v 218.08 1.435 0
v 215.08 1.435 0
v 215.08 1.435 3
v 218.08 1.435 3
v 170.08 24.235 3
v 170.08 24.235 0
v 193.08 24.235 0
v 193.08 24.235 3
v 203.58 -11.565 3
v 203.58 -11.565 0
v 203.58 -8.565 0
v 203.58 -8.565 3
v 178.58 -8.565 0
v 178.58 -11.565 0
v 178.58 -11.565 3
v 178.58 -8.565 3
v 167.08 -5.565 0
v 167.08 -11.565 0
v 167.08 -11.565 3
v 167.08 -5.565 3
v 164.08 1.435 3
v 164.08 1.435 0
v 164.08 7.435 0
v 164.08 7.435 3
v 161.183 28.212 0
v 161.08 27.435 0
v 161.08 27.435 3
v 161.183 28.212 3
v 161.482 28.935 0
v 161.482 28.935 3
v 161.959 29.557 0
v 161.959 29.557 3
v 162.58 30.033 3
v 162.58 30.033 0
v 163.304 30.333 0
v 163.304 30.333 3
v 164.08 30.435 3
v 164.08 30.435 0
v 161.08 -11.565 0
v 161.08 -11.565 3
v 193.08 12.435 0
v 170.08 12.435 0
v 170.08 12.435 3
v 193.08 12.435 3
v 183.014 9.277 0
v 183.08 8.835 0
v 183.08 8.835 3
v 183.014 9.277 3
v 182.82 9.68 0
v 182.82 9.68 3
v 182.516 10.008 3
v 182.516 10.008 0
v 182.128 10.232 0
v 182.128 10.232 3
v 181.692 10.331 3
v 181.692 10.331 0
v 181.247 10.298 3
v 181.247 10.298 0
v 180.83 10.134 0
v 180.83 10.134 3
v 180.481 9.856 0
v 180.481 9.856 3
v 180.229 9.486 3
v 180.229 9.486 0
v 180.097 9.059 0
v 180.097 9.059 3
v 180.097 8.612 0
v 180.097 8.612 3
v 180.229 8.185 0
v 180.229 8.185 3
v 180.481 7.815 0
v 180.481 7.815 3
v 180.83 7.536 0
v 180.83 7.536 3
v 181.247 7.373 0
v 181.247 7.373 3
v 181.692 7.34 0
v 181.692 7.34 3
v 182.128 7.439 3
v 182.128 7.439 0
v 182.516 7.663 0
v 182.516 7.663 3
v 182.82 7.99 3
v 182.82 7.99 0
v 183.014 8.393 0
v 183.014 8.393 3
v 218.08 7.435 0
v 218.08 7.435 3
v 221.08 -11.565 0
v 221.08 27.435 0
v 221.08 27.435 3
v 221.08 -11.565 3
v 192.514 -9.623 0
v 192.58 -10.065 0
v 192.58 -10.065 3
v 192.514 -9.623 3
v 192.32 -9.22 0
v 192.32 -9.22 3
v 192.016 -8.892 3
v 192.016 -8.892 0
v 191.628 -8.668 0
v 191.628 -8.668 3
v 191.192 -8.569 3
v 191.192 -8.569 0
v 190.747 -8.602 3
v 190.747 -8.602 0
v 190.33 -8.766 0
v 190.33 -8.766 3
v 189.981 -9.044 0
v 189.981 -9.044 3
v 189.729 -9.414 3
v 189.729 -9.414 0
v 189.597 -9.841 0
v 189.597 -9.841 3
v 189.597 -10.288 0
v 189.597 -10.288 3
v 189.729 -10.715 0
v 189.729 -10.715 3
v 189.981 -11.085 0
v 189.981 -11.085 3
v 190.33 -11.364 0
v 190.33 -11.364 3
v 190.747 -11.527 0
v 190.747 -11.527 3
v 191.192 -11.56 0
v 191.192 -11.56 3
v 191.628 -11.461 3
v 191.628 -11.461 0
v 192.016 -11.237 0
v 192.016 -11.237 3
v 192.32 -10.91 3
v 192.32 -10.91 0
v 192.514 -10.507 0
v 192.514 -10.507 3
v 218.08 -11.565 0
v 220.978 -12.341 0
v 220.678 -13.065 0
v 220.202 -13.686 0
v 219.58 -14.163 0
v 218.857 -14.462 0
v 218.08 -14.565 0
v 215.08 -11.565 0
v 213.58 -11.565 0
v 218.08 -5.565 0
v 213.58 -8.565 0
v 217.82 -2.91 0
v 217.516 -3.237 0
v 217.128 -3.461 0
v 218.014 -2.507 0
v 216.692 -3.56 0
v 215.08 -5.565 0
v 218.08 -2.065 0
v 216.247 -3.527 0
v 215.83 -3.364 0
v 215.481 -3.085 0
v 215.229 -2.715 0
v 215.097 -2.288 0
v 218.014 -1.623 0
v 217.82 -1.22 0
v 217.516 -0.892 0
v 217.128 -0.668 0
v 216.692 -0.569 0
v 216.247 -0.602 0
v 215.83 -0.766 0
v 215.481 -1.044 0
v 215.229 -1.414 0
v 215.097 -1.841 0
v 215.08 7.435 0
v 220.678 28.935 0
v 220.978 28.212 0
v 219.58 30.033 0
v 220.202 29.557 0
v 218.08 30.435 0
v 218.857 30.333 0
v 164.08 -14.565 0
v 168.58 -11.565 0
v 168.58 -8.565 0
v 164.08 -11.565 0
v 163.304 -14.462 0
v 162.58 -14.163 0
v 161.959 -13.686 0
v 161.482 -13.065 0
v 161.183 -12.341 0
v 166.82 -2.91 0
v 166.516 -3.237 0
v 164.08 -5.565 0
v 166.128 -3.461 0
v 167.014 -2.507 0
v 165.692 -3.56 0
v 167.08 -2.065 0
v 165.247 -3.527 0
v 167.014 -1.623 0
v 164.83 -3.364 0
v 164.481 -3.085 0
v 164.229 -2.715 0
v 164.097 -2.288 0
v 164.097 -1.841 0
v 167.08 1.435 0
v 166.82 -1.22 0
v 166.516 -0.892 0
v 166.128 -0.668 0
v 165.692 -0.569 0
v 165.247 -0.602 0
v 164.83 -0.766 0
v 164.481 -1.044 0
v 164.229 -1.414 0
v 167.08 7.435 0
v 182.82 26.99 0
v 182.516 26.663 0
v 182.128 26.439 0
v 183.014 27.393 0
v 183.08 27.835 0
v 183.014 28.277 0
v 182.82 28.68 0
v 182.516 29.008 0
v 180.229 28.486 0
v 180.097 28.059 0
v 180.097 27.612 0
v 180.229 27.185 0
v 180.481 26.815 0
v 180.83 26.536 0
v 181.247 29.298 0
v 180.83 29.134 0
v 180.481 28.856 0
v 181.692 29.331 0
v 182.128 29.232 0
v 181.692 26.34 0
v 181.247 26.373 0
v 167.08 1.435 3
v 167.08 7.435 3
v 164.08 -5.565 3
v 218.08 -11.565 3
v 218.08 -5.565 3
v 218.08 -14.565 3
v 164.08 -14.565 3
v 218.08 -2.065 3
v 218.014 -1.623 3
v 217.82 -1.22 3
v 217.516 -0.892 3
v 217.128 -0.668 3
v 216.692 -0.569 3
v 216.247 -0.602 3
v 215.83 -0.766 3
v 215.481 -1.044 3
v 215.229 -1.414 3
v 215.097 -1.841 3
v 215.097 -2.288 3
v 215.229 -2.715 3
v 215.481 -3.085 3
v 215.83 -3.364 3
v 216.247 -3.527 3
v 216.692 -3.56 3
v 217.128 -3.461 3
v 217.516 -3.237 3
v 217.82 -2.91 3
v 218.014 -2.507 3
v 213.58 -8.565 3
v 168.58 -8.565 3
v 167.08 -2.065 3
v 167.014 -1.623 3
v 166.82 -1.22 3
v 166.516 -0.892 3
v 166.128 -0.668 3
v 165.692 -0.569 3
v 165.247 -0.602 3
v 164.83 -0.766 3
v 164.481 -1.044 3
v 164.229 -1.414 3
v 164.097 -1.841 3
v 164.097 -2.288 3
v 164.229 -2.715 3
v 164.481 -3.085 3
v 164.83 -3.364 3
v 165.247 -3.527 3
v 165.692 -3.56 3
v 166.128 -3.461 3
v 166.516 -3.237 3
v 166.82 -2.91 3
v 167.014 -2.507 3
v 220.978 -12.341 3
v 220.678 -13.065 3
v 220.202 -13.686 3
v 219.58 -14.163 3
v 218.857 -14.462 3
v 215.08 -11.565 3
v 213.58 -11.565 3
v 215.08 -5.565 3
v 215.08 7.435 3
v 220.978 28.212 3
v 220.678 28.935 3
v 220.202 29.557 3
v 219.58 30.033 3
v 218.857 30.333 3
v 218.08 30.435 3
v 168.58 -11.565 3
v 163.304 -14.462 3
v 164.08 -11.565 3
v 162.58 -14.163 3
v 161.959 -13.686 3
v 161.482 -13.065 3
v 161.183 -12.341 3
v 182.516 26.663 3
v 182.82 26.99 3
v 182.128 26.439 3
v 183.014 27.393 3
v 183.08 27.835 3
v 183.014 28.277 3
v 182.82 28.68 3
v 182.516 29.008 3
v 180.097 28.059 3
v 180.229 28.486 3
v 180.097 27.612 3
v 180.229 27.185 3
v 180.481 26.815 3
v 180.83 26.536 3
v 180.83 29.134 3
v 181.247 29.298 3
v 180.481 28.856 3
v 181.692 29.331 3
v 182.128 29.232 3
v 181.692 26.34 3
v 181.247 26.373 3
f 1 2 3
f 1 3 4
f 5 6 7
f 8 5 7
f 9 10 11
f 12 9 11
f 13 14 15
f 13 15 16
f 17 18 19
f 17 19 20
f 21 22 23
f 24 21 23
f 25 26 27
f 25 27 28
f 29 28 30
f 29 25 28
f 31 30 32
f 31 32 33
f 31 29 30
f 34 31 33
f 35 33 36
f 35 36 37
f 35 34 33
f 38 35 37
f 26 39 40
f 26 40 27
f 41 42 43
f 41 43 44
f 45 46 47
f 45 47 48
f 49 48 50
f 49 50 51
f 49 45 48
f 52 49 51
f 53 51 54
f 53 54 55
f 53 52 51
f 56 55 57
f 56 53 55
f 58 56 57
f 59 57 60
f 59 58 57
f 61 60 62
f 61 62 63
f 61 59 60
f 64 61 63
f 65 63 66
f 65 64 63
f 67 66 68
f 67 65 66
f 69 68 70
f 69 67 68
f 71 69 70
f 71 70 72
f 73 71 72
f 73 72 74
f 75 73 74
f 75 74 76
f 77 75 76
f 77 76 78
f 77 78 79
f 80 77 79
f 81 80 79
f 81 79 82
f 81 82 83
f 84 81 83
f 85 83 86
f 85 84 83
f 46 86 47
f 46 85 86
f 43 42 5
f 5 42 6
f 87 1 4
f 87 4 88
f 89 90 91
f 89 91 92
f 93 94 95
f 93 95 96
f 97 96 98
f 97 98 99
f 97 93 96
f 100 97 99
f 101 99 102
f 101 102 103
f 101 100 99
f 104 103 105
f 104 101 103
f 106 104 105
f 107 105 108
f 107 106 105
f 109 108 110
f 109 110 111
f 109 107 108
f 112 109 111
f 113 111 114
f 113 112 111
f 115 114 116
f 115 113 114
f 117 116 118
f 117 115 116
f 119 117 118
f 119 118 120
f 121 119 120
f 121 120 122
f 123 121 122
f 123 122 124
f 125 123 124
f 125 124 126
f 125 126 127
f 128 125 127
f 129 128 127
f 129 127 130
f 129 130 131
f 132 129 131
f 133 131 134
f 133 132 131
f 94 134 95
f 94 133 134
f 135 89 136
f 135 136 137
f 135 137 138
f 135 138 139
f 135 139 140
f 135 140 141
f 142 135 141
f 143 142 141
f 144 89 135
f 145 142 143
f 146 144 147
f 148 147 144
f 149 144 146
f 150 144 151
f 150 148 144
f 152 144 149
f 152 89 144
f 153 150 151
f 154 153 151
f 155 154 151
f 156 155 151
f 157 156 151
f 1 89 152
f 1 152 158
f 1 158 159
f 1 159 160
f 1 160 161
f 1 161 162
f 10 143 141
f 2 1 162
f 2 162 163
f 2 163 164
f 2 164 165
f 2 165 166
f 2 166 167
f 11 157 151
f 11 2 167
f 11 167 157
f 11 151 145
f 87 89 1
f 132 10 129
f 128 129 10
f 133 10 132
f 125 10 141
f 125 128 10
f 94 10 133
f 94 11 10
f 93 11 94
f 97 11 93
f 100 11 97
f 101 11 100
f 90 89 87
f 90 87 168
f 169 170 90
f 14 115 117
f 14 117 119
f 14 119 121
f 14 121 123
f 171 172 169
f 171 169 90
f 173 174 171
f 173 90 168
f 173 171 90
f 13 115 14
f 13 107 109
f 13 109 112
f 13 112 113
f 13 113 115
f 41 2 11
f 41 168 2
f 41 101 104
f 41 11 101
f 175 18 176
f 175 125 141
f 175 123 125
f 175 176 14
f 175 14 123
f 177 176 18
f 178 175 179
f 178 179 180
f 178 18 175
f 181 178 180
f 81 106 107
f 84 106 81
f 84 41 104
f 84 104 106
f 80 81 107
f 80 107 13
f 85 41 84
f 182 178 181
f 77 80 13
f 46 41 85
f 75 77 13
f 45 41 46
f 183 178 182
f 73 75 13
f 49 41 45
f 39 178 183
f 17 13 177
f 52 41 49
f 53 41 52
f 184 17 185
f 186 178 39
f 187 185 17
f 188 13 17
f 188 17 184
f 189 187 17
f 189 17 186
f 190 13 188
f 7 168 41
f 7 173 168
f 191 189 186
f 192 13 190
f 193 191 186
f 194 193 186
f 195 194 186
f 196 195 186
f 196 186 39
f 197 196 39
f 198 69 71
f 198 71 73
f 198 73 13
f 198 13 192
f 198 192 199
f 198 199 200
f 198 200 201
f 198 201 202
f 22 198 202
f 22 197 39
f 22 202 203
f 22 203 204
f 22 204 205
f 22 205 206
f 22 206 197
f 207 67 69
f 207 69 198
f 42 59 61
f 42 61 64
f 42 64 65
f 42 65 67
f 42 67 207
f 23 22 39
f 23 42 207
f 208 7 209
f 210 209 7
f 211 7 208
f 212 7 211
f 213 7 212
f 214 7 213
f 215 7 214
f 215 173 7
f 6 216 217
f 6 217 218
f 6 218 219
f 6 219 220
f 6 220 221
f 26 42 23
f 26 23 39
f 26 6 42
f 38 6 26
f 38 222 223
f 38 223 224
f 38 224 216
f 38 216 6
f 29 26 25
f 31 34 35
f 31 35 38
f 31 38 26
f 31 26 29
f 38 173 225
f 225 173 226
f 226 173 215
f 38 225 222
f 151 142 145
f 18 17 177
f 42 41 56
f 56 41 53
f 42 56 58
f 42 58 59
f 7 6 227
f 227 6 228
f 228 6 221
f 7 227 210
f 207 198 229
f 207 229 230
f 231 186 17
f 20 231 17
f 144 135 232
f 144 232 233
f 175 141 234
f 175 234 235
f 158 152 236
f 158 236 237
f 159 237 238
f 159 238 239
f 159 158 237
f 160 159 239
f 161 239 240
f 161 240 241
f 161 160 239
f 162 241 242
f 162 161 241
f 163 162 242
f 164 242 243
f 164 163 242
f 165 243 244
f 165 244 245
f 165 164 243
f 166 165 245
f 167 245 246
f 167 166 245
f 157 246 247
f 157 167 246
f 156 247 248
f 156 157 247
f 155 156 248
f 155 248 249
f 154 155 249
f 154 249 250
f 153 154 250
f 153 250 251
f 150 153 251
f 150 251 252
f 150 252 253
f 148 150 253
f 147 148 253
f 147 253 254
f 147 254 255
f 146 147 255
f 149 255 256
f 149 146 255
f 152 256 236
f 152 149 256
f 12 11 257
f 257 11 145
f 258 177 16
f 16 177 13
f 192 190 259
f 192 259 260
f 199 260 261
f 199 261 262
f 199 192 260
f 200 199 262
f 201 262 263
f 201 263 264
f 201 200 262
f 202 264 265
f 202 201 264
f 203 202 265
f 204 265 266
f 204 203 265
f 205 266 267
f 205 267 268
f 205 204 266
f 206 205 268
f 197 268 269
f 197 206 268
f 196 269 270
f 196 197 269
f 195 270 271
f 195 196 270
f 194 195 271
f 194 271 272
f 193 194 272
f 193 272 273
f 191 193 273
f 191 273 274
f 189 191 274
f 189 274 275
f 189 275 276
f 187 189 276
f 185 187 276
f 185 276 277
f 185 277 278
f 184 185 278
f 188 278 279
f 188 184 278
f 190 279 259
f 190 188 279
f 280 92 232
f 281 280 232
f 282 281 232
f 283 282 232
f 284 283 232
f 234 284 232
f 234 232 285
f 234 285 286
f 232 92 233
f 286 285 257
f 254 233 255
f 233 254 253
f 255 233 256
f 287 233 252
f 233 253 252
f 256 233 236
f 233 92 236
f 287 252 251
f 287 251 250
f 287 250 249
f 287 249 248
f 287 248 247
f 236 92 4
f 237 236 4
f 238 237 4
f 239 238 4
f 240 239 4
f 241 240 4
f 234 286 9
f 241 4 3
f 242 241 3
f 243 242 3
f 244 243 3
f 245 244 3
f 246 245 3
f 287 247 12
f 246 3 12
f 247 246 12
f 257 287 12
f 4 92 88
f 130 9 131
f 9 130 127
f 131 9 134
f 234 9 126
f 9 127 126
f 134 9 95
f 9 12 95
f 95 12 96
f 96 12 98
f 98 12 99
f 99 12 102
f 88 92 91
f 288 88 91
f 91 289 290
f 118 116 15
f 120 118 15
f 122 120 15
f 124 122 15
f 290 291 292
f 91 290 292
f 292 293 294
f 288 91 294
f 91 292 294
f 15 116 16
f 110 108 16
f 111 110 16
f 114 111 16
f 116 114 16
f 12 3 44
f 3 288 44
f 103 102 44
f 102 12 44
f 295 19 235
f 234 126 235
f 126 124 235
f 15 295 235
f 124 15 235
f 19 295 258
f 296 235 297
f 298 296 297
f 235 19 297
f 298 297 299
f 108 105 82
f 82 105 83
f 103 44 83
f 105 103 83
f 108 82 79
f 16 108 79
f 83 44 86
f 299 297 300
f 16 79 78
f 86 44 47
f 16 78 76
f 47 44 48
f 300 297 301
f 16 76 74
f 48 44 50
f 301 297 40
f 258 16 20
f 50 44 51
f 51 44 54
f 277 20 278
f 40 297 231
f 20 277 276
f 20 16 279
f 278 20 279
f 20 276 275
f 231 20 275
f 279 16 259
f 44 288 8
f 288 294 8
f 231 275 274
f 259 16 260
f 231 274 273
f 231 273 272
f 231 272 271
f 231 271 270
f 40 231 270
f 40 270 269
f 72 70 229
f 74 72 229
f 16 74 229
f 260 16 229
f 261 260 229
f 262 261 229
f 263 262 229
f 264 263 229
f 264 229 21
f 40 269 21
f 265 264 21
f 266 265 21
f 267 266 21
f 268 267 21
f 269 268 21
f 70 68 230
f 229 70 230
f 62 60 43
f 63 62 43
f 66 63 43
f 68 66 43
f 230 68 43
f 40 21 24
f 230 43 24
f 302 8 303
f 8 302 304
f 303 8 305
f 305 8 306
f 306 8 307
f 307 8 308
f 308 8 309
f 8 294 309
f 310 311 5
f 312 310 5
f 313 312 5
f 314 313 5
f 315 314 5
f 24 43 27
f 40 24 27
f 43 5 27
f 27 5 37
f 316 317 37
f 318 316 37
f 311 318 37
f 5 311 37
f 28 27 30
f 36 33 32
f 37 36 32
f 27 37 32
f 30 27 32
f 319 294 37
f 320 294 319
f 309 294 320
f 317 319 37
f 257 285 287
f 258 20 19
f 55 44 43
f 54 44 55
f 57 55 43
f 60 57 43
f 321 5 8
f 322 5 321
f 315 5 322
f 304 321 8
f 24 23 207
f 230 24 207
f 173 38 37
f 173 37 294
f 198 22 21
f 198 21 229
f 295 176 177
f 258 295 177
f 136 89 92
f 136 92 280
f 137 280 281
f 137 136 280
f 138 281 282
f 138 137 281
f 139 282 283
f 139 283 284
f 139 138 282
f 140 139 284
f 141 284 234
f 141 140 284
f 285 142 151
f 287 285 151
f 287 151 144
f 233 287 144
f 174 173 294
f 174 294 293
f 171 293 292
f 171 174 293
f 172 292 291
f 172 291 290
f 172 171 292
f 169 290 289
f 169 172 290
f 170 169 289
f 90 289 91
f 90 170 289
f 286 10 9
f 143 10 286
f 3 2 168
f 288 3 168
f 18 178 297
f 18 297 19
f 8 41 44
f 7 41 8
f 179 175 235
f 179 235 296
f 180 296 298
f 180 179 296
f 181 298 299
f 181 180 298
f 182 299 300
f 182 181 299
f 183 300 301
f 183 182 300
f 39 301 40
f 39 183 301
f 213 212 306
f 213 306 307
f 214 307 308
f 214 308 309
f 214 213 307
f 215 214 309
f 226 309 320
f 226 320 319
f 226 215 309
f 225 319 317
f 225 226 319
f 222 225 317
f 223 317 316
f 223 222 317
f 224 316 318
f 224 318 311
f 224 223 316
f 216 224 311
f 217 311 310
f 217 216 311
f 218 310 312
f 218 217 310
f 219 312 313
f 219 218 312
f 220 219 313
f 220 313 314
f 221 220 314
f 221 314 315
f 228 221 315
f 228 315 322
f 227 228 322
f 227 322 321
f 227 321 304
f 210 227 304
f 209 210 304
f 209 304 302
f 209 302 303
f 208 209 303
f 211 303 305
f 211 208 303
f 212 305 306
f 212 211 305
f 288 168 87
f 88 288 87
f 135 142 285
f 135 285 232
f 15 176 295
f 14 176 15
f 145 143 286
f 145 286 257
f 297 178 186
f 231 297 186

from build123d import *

# Parameters (mm, degrees)
ESQUISSE12_R        = 1.5
ESQUISSE12_W        = 3
ESQUISSE12_H        = 6
ESQUISSE12_W_2      = 10
ESQUISSE12_H_2      = 3
ESQUISSE12_W_3      = 23
ESQUISSE12_H_3      = 11.8
BOSS_EXTRU_12_DEPTH = 3


with BuildPart() as part:
    # Esquisse12 → Boss.-Extru.12 (new body)
    with BuildSketch(Plane.XY):
        with BuildLine():
            Line((218.080291561, -14.564673514), (164.080291561, -14.564673514))
            ThreePointArc((164.080291561, -14.564673514), (161.958971217, -13.685993857), (161.080291561, -11.564673514))
            Line((161.080291561, -11.564673514), (161.080291561, 27.435326486))
            ThreePointArc((161.080291561, 27.435326486), (161.958971217, 29.55664683), (164.080291561, 30.435326486))
            Line((164.080291561, 30.435326486), (218.080291561, 30.435326486))
            ThreePointArc((218.080291561, 30.435326486), (220.201611904, 29.55664683), (221.080291561, 27.435326486))
            Line((221.080291561, 27.435326486), (221.080291561, -11.564673514))
            ThreePointArc((221.080291561, -11.564673514), (220.201611904, -13.685993857), (218.080291561, -14.564673514))
        make_face()
        with Locations((191.080291561, -10.064673514)):
            Circle(ESQUISSE12_R, mode=Mode.SUBTRACT)
        with Locations((181.580291561, 8.835326486)):
            Circle(ESQUISSE12_R, mode=Mode.SUBTRACT)
        with Locations((181.580291561, 27.835326486)):
            Circle(ESQUISSE12_R, mode=Mode.SUBTRACT)
        with Locations((216.580291561, -2.064673514)):
            Circle(ESQUISSE12_R, mode=Mode.SUBTRACT)
        with Locations((165.580291561, -2.064673514)):
            Circle(ESQUISSE12_R, mode=Mode.SUBTRACT)
        with Locations((165.580291561, -8.564673514)):
            Rectangle(ESQUISSE12_W, ESQUISSE12_H, mode=Mode.SUBTRACT)
        with Locations((173.580291561, -10.064673514)):
            Rectangle(ESQUISSE12_W_2, ESQUISSE12_H_2, mode=Mode.SUBTRACT)
        with Locations((216.580291561, -8.564673514)):
            Rectangle(ESQUISSE12_W, ESQUISSE12_H, mode=Mode.SUBTRACT)
        with Locations((208.580291561, -10.064673514)):
            Rectangle(ESQUISSE12_W_2, ESQUISSE12_H_2, mode=Mode.SUBTRACT)
        with Locations((165.580291561, 4.435326486)):
            Rectangle(ESQUISSE12_W, ESQUISSE12_H, mode=Mode.SUBTRACT)
        with Locations((216.580291561, 4.435326486)):
            Rectangle(ESQUISSE12_W, ESQUISSE12_H, mode=Mode.SUBTRACT)
        with Locations((181.580291561, 18.335326486)):
            Rectangle(ESQUISSE12_W_3, ESQUISSE12_H_3, mode=Mode.SUBTRACT)
    extrude(amount=BOSS_EXTRU_12_DEPTH)


solid = part.part
